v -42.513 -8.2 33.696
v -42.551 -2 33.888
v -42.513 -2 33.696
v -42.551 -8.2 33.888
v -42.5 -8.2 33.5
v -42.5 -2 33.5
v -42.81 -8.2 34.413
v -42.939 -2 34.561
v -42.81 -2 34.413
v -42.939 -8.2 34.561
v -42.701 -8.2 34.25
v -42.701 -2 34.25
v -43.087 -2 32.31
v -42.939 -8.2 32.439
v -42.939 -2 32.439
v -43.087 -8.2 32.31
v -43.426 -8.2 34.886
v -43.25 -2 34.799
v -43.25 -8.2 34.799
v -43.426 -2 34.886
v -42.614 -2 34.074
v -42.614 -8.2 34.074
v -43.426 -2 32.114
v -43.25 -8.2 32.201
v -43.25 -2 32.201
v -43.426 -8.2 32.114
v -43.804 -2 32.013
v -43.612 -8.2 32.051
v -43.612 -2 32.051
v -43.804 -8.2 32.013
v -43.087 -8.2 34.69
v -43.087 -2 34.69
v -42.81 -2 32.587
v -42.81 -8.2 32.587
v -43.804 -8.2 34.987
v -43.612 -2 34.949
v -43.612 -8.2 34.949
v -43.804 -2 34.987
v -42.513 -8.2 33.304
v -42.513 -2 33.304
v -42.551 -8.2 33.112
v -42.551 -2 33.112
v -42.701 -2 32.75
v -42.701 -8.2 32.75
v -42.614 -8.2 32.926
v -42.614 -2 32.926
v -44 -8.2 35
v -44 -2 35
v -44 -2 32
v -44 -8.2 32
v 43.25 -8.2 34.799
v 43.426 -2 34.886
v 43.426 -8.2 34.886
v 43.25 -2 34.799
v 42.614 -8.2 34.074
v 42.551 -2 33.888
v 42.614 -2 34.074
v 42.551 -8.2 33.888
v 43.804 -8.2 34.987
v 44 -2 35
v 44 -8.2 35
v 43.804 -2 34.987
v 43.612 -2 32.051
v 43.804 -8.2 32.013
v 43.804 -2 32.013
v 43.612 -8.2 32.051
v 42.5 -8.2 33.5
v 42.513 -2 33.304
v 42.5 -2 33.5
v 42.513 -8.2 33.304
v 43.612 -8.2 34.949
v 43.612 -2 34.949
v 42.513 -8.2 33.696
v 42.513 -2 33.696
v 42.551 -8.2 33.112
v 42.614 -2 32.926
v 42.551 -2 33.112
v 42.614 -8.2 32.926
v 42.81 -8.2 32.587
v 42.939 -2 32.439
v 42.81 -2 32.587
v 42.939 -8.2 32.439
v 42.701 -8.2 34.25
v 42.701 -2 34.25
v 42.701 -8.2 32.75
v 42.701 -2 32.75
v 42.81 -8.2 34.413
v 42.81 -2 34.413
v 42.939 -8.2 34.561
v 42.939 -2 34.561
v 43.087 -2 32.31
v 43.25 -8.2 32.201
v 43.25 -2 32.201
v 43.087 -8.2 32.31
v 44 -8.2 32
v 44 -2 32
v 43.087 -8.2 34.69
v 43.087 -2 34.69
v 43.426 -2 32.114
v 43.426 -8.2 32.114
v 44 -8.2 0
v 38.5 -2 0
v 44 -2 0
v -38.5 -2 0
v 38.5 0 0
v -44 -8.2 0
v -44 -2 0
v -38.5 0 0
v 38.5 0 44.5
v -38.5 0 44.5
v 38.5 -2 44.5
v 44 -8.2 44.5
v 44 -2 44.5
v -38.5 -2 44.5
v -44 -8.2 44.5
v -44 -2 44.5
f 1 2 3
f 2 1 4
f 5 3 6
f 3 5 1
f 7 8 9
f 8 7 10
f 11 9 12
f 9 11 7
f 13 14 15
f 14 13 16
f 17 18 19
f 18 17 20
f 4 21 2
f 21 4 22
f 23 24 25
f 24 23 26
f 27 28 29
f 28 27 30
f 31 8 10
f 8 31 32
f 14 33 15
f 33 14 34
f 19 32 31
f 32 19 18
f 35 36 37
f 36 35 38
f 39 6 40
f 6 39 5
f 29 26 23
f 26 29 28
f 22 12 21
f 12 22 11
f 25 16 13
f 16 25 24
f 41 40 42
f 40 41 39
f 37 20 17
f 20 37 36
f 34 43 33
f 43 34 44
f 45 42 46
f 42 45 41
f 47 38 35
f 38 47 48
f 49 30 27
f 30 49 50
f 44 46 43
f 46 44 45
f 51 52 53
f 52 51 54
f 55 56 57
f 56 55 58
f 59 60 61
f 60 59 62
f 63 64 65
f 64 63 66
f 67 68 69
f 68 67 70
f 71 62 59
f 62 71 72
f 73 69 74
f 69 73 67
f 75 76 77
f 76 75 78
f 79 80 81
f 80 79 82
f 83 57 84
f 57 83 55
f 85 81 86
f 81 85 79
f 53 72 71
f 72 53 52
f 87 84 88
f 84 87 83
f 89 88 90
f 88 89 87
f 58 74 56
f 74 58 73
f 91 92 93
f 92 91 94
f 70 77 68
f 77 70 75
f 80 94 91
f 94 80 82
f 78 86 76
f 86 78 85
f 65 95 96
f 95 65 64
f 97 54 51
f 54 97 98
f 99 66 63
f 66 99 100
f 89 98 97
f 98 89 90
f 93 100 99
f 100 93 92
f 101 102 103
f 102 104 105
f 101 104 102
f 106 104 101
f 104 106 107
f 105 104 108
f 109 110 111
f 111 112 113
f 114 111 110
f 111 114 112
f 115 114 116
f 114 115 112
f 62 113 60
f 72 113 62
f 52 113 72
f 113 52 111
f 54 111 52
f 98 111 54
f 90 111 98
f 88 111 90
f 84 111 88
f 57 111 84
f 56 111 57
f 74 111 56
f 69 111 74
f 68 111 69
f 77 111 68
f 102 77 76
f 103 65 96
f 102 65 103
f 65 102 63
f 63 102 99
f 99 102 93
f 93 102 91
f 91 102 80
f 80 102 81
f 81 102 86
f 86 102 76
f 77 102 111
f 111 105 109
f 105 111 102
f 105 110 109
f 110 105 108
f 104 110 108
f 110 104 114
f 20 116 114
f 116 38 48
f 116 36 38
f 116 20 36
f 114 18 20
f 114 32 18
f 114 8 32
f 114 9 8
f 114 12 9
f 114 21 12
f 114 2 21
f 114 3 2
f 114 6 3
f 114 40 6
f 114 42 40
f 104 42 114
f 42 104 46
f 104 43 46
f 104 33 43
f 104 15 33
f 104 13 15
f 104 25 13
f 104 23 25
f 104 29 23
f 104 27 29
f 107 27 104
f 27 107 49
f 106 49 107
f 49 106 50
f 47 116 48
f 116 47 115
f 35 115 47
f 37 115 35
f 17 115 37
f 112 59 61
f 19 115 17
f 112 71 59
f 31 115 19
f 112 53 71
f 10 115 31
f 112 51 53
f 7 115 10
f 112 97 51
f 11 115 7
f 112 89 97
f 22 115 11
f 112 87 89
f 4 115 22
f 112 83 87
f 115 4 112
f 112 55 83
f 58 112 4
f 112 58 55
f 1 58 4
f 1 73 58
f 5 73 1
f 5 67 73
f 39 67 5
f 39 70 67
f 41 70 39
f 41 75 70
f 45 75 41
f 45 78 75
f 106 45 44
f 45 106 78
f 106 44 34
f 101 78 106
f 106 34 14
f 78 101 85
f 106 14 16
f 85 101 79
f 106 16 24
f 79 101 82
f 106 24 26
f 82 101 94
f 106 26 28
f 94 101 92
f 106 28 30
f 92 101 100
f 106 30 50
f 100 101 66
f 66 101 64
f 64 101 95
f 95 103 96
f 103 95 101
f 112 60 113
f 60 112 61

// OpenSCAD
/* [Wall Hook] */
//Dimensions of the front plate (holder)
wllHkPltDims=[88,6.2,44.5];
//Dimension of the back plate (wall)
wllHkBckDims=[77,2,44.5];
wllHkNudgeZPos=33.5;
wllHkNudgeDia=3;
wllHkCtrHoleDia=5;

/* [Bottles] */

/* [Hidden]*/
wllHkOvDims=[wllHkPltDims.x,wllHkBckDims.y+wllHkPltDims.y,wllHkBckDims.z];
fudge=0.1;
$fn=48;

wallHook();

module wallHook(){
  difference(){
    linear_extrude(wllHkBckDims.z,convexity=3){
      translate([0,-wllHkBckDims.y/2]) square([wllHkBckDims.x,wllHkBckDims.y],true);
      translate([0,-wllHkBckDims.y-wllHkPltDims.y/2]) square([wllHkPltDims.x,wllHkPltDims.y],true);
    }
    for (ix=[-1,1])
      translate([ix*wllHkPltDims.x/2,0,wllHkNudgeZPos]) 
        rotate([90,0,0]) cylinder(d=wllHkNudgeDia,h=wllHkOvDims.y+fudge);
    
  }  
}
